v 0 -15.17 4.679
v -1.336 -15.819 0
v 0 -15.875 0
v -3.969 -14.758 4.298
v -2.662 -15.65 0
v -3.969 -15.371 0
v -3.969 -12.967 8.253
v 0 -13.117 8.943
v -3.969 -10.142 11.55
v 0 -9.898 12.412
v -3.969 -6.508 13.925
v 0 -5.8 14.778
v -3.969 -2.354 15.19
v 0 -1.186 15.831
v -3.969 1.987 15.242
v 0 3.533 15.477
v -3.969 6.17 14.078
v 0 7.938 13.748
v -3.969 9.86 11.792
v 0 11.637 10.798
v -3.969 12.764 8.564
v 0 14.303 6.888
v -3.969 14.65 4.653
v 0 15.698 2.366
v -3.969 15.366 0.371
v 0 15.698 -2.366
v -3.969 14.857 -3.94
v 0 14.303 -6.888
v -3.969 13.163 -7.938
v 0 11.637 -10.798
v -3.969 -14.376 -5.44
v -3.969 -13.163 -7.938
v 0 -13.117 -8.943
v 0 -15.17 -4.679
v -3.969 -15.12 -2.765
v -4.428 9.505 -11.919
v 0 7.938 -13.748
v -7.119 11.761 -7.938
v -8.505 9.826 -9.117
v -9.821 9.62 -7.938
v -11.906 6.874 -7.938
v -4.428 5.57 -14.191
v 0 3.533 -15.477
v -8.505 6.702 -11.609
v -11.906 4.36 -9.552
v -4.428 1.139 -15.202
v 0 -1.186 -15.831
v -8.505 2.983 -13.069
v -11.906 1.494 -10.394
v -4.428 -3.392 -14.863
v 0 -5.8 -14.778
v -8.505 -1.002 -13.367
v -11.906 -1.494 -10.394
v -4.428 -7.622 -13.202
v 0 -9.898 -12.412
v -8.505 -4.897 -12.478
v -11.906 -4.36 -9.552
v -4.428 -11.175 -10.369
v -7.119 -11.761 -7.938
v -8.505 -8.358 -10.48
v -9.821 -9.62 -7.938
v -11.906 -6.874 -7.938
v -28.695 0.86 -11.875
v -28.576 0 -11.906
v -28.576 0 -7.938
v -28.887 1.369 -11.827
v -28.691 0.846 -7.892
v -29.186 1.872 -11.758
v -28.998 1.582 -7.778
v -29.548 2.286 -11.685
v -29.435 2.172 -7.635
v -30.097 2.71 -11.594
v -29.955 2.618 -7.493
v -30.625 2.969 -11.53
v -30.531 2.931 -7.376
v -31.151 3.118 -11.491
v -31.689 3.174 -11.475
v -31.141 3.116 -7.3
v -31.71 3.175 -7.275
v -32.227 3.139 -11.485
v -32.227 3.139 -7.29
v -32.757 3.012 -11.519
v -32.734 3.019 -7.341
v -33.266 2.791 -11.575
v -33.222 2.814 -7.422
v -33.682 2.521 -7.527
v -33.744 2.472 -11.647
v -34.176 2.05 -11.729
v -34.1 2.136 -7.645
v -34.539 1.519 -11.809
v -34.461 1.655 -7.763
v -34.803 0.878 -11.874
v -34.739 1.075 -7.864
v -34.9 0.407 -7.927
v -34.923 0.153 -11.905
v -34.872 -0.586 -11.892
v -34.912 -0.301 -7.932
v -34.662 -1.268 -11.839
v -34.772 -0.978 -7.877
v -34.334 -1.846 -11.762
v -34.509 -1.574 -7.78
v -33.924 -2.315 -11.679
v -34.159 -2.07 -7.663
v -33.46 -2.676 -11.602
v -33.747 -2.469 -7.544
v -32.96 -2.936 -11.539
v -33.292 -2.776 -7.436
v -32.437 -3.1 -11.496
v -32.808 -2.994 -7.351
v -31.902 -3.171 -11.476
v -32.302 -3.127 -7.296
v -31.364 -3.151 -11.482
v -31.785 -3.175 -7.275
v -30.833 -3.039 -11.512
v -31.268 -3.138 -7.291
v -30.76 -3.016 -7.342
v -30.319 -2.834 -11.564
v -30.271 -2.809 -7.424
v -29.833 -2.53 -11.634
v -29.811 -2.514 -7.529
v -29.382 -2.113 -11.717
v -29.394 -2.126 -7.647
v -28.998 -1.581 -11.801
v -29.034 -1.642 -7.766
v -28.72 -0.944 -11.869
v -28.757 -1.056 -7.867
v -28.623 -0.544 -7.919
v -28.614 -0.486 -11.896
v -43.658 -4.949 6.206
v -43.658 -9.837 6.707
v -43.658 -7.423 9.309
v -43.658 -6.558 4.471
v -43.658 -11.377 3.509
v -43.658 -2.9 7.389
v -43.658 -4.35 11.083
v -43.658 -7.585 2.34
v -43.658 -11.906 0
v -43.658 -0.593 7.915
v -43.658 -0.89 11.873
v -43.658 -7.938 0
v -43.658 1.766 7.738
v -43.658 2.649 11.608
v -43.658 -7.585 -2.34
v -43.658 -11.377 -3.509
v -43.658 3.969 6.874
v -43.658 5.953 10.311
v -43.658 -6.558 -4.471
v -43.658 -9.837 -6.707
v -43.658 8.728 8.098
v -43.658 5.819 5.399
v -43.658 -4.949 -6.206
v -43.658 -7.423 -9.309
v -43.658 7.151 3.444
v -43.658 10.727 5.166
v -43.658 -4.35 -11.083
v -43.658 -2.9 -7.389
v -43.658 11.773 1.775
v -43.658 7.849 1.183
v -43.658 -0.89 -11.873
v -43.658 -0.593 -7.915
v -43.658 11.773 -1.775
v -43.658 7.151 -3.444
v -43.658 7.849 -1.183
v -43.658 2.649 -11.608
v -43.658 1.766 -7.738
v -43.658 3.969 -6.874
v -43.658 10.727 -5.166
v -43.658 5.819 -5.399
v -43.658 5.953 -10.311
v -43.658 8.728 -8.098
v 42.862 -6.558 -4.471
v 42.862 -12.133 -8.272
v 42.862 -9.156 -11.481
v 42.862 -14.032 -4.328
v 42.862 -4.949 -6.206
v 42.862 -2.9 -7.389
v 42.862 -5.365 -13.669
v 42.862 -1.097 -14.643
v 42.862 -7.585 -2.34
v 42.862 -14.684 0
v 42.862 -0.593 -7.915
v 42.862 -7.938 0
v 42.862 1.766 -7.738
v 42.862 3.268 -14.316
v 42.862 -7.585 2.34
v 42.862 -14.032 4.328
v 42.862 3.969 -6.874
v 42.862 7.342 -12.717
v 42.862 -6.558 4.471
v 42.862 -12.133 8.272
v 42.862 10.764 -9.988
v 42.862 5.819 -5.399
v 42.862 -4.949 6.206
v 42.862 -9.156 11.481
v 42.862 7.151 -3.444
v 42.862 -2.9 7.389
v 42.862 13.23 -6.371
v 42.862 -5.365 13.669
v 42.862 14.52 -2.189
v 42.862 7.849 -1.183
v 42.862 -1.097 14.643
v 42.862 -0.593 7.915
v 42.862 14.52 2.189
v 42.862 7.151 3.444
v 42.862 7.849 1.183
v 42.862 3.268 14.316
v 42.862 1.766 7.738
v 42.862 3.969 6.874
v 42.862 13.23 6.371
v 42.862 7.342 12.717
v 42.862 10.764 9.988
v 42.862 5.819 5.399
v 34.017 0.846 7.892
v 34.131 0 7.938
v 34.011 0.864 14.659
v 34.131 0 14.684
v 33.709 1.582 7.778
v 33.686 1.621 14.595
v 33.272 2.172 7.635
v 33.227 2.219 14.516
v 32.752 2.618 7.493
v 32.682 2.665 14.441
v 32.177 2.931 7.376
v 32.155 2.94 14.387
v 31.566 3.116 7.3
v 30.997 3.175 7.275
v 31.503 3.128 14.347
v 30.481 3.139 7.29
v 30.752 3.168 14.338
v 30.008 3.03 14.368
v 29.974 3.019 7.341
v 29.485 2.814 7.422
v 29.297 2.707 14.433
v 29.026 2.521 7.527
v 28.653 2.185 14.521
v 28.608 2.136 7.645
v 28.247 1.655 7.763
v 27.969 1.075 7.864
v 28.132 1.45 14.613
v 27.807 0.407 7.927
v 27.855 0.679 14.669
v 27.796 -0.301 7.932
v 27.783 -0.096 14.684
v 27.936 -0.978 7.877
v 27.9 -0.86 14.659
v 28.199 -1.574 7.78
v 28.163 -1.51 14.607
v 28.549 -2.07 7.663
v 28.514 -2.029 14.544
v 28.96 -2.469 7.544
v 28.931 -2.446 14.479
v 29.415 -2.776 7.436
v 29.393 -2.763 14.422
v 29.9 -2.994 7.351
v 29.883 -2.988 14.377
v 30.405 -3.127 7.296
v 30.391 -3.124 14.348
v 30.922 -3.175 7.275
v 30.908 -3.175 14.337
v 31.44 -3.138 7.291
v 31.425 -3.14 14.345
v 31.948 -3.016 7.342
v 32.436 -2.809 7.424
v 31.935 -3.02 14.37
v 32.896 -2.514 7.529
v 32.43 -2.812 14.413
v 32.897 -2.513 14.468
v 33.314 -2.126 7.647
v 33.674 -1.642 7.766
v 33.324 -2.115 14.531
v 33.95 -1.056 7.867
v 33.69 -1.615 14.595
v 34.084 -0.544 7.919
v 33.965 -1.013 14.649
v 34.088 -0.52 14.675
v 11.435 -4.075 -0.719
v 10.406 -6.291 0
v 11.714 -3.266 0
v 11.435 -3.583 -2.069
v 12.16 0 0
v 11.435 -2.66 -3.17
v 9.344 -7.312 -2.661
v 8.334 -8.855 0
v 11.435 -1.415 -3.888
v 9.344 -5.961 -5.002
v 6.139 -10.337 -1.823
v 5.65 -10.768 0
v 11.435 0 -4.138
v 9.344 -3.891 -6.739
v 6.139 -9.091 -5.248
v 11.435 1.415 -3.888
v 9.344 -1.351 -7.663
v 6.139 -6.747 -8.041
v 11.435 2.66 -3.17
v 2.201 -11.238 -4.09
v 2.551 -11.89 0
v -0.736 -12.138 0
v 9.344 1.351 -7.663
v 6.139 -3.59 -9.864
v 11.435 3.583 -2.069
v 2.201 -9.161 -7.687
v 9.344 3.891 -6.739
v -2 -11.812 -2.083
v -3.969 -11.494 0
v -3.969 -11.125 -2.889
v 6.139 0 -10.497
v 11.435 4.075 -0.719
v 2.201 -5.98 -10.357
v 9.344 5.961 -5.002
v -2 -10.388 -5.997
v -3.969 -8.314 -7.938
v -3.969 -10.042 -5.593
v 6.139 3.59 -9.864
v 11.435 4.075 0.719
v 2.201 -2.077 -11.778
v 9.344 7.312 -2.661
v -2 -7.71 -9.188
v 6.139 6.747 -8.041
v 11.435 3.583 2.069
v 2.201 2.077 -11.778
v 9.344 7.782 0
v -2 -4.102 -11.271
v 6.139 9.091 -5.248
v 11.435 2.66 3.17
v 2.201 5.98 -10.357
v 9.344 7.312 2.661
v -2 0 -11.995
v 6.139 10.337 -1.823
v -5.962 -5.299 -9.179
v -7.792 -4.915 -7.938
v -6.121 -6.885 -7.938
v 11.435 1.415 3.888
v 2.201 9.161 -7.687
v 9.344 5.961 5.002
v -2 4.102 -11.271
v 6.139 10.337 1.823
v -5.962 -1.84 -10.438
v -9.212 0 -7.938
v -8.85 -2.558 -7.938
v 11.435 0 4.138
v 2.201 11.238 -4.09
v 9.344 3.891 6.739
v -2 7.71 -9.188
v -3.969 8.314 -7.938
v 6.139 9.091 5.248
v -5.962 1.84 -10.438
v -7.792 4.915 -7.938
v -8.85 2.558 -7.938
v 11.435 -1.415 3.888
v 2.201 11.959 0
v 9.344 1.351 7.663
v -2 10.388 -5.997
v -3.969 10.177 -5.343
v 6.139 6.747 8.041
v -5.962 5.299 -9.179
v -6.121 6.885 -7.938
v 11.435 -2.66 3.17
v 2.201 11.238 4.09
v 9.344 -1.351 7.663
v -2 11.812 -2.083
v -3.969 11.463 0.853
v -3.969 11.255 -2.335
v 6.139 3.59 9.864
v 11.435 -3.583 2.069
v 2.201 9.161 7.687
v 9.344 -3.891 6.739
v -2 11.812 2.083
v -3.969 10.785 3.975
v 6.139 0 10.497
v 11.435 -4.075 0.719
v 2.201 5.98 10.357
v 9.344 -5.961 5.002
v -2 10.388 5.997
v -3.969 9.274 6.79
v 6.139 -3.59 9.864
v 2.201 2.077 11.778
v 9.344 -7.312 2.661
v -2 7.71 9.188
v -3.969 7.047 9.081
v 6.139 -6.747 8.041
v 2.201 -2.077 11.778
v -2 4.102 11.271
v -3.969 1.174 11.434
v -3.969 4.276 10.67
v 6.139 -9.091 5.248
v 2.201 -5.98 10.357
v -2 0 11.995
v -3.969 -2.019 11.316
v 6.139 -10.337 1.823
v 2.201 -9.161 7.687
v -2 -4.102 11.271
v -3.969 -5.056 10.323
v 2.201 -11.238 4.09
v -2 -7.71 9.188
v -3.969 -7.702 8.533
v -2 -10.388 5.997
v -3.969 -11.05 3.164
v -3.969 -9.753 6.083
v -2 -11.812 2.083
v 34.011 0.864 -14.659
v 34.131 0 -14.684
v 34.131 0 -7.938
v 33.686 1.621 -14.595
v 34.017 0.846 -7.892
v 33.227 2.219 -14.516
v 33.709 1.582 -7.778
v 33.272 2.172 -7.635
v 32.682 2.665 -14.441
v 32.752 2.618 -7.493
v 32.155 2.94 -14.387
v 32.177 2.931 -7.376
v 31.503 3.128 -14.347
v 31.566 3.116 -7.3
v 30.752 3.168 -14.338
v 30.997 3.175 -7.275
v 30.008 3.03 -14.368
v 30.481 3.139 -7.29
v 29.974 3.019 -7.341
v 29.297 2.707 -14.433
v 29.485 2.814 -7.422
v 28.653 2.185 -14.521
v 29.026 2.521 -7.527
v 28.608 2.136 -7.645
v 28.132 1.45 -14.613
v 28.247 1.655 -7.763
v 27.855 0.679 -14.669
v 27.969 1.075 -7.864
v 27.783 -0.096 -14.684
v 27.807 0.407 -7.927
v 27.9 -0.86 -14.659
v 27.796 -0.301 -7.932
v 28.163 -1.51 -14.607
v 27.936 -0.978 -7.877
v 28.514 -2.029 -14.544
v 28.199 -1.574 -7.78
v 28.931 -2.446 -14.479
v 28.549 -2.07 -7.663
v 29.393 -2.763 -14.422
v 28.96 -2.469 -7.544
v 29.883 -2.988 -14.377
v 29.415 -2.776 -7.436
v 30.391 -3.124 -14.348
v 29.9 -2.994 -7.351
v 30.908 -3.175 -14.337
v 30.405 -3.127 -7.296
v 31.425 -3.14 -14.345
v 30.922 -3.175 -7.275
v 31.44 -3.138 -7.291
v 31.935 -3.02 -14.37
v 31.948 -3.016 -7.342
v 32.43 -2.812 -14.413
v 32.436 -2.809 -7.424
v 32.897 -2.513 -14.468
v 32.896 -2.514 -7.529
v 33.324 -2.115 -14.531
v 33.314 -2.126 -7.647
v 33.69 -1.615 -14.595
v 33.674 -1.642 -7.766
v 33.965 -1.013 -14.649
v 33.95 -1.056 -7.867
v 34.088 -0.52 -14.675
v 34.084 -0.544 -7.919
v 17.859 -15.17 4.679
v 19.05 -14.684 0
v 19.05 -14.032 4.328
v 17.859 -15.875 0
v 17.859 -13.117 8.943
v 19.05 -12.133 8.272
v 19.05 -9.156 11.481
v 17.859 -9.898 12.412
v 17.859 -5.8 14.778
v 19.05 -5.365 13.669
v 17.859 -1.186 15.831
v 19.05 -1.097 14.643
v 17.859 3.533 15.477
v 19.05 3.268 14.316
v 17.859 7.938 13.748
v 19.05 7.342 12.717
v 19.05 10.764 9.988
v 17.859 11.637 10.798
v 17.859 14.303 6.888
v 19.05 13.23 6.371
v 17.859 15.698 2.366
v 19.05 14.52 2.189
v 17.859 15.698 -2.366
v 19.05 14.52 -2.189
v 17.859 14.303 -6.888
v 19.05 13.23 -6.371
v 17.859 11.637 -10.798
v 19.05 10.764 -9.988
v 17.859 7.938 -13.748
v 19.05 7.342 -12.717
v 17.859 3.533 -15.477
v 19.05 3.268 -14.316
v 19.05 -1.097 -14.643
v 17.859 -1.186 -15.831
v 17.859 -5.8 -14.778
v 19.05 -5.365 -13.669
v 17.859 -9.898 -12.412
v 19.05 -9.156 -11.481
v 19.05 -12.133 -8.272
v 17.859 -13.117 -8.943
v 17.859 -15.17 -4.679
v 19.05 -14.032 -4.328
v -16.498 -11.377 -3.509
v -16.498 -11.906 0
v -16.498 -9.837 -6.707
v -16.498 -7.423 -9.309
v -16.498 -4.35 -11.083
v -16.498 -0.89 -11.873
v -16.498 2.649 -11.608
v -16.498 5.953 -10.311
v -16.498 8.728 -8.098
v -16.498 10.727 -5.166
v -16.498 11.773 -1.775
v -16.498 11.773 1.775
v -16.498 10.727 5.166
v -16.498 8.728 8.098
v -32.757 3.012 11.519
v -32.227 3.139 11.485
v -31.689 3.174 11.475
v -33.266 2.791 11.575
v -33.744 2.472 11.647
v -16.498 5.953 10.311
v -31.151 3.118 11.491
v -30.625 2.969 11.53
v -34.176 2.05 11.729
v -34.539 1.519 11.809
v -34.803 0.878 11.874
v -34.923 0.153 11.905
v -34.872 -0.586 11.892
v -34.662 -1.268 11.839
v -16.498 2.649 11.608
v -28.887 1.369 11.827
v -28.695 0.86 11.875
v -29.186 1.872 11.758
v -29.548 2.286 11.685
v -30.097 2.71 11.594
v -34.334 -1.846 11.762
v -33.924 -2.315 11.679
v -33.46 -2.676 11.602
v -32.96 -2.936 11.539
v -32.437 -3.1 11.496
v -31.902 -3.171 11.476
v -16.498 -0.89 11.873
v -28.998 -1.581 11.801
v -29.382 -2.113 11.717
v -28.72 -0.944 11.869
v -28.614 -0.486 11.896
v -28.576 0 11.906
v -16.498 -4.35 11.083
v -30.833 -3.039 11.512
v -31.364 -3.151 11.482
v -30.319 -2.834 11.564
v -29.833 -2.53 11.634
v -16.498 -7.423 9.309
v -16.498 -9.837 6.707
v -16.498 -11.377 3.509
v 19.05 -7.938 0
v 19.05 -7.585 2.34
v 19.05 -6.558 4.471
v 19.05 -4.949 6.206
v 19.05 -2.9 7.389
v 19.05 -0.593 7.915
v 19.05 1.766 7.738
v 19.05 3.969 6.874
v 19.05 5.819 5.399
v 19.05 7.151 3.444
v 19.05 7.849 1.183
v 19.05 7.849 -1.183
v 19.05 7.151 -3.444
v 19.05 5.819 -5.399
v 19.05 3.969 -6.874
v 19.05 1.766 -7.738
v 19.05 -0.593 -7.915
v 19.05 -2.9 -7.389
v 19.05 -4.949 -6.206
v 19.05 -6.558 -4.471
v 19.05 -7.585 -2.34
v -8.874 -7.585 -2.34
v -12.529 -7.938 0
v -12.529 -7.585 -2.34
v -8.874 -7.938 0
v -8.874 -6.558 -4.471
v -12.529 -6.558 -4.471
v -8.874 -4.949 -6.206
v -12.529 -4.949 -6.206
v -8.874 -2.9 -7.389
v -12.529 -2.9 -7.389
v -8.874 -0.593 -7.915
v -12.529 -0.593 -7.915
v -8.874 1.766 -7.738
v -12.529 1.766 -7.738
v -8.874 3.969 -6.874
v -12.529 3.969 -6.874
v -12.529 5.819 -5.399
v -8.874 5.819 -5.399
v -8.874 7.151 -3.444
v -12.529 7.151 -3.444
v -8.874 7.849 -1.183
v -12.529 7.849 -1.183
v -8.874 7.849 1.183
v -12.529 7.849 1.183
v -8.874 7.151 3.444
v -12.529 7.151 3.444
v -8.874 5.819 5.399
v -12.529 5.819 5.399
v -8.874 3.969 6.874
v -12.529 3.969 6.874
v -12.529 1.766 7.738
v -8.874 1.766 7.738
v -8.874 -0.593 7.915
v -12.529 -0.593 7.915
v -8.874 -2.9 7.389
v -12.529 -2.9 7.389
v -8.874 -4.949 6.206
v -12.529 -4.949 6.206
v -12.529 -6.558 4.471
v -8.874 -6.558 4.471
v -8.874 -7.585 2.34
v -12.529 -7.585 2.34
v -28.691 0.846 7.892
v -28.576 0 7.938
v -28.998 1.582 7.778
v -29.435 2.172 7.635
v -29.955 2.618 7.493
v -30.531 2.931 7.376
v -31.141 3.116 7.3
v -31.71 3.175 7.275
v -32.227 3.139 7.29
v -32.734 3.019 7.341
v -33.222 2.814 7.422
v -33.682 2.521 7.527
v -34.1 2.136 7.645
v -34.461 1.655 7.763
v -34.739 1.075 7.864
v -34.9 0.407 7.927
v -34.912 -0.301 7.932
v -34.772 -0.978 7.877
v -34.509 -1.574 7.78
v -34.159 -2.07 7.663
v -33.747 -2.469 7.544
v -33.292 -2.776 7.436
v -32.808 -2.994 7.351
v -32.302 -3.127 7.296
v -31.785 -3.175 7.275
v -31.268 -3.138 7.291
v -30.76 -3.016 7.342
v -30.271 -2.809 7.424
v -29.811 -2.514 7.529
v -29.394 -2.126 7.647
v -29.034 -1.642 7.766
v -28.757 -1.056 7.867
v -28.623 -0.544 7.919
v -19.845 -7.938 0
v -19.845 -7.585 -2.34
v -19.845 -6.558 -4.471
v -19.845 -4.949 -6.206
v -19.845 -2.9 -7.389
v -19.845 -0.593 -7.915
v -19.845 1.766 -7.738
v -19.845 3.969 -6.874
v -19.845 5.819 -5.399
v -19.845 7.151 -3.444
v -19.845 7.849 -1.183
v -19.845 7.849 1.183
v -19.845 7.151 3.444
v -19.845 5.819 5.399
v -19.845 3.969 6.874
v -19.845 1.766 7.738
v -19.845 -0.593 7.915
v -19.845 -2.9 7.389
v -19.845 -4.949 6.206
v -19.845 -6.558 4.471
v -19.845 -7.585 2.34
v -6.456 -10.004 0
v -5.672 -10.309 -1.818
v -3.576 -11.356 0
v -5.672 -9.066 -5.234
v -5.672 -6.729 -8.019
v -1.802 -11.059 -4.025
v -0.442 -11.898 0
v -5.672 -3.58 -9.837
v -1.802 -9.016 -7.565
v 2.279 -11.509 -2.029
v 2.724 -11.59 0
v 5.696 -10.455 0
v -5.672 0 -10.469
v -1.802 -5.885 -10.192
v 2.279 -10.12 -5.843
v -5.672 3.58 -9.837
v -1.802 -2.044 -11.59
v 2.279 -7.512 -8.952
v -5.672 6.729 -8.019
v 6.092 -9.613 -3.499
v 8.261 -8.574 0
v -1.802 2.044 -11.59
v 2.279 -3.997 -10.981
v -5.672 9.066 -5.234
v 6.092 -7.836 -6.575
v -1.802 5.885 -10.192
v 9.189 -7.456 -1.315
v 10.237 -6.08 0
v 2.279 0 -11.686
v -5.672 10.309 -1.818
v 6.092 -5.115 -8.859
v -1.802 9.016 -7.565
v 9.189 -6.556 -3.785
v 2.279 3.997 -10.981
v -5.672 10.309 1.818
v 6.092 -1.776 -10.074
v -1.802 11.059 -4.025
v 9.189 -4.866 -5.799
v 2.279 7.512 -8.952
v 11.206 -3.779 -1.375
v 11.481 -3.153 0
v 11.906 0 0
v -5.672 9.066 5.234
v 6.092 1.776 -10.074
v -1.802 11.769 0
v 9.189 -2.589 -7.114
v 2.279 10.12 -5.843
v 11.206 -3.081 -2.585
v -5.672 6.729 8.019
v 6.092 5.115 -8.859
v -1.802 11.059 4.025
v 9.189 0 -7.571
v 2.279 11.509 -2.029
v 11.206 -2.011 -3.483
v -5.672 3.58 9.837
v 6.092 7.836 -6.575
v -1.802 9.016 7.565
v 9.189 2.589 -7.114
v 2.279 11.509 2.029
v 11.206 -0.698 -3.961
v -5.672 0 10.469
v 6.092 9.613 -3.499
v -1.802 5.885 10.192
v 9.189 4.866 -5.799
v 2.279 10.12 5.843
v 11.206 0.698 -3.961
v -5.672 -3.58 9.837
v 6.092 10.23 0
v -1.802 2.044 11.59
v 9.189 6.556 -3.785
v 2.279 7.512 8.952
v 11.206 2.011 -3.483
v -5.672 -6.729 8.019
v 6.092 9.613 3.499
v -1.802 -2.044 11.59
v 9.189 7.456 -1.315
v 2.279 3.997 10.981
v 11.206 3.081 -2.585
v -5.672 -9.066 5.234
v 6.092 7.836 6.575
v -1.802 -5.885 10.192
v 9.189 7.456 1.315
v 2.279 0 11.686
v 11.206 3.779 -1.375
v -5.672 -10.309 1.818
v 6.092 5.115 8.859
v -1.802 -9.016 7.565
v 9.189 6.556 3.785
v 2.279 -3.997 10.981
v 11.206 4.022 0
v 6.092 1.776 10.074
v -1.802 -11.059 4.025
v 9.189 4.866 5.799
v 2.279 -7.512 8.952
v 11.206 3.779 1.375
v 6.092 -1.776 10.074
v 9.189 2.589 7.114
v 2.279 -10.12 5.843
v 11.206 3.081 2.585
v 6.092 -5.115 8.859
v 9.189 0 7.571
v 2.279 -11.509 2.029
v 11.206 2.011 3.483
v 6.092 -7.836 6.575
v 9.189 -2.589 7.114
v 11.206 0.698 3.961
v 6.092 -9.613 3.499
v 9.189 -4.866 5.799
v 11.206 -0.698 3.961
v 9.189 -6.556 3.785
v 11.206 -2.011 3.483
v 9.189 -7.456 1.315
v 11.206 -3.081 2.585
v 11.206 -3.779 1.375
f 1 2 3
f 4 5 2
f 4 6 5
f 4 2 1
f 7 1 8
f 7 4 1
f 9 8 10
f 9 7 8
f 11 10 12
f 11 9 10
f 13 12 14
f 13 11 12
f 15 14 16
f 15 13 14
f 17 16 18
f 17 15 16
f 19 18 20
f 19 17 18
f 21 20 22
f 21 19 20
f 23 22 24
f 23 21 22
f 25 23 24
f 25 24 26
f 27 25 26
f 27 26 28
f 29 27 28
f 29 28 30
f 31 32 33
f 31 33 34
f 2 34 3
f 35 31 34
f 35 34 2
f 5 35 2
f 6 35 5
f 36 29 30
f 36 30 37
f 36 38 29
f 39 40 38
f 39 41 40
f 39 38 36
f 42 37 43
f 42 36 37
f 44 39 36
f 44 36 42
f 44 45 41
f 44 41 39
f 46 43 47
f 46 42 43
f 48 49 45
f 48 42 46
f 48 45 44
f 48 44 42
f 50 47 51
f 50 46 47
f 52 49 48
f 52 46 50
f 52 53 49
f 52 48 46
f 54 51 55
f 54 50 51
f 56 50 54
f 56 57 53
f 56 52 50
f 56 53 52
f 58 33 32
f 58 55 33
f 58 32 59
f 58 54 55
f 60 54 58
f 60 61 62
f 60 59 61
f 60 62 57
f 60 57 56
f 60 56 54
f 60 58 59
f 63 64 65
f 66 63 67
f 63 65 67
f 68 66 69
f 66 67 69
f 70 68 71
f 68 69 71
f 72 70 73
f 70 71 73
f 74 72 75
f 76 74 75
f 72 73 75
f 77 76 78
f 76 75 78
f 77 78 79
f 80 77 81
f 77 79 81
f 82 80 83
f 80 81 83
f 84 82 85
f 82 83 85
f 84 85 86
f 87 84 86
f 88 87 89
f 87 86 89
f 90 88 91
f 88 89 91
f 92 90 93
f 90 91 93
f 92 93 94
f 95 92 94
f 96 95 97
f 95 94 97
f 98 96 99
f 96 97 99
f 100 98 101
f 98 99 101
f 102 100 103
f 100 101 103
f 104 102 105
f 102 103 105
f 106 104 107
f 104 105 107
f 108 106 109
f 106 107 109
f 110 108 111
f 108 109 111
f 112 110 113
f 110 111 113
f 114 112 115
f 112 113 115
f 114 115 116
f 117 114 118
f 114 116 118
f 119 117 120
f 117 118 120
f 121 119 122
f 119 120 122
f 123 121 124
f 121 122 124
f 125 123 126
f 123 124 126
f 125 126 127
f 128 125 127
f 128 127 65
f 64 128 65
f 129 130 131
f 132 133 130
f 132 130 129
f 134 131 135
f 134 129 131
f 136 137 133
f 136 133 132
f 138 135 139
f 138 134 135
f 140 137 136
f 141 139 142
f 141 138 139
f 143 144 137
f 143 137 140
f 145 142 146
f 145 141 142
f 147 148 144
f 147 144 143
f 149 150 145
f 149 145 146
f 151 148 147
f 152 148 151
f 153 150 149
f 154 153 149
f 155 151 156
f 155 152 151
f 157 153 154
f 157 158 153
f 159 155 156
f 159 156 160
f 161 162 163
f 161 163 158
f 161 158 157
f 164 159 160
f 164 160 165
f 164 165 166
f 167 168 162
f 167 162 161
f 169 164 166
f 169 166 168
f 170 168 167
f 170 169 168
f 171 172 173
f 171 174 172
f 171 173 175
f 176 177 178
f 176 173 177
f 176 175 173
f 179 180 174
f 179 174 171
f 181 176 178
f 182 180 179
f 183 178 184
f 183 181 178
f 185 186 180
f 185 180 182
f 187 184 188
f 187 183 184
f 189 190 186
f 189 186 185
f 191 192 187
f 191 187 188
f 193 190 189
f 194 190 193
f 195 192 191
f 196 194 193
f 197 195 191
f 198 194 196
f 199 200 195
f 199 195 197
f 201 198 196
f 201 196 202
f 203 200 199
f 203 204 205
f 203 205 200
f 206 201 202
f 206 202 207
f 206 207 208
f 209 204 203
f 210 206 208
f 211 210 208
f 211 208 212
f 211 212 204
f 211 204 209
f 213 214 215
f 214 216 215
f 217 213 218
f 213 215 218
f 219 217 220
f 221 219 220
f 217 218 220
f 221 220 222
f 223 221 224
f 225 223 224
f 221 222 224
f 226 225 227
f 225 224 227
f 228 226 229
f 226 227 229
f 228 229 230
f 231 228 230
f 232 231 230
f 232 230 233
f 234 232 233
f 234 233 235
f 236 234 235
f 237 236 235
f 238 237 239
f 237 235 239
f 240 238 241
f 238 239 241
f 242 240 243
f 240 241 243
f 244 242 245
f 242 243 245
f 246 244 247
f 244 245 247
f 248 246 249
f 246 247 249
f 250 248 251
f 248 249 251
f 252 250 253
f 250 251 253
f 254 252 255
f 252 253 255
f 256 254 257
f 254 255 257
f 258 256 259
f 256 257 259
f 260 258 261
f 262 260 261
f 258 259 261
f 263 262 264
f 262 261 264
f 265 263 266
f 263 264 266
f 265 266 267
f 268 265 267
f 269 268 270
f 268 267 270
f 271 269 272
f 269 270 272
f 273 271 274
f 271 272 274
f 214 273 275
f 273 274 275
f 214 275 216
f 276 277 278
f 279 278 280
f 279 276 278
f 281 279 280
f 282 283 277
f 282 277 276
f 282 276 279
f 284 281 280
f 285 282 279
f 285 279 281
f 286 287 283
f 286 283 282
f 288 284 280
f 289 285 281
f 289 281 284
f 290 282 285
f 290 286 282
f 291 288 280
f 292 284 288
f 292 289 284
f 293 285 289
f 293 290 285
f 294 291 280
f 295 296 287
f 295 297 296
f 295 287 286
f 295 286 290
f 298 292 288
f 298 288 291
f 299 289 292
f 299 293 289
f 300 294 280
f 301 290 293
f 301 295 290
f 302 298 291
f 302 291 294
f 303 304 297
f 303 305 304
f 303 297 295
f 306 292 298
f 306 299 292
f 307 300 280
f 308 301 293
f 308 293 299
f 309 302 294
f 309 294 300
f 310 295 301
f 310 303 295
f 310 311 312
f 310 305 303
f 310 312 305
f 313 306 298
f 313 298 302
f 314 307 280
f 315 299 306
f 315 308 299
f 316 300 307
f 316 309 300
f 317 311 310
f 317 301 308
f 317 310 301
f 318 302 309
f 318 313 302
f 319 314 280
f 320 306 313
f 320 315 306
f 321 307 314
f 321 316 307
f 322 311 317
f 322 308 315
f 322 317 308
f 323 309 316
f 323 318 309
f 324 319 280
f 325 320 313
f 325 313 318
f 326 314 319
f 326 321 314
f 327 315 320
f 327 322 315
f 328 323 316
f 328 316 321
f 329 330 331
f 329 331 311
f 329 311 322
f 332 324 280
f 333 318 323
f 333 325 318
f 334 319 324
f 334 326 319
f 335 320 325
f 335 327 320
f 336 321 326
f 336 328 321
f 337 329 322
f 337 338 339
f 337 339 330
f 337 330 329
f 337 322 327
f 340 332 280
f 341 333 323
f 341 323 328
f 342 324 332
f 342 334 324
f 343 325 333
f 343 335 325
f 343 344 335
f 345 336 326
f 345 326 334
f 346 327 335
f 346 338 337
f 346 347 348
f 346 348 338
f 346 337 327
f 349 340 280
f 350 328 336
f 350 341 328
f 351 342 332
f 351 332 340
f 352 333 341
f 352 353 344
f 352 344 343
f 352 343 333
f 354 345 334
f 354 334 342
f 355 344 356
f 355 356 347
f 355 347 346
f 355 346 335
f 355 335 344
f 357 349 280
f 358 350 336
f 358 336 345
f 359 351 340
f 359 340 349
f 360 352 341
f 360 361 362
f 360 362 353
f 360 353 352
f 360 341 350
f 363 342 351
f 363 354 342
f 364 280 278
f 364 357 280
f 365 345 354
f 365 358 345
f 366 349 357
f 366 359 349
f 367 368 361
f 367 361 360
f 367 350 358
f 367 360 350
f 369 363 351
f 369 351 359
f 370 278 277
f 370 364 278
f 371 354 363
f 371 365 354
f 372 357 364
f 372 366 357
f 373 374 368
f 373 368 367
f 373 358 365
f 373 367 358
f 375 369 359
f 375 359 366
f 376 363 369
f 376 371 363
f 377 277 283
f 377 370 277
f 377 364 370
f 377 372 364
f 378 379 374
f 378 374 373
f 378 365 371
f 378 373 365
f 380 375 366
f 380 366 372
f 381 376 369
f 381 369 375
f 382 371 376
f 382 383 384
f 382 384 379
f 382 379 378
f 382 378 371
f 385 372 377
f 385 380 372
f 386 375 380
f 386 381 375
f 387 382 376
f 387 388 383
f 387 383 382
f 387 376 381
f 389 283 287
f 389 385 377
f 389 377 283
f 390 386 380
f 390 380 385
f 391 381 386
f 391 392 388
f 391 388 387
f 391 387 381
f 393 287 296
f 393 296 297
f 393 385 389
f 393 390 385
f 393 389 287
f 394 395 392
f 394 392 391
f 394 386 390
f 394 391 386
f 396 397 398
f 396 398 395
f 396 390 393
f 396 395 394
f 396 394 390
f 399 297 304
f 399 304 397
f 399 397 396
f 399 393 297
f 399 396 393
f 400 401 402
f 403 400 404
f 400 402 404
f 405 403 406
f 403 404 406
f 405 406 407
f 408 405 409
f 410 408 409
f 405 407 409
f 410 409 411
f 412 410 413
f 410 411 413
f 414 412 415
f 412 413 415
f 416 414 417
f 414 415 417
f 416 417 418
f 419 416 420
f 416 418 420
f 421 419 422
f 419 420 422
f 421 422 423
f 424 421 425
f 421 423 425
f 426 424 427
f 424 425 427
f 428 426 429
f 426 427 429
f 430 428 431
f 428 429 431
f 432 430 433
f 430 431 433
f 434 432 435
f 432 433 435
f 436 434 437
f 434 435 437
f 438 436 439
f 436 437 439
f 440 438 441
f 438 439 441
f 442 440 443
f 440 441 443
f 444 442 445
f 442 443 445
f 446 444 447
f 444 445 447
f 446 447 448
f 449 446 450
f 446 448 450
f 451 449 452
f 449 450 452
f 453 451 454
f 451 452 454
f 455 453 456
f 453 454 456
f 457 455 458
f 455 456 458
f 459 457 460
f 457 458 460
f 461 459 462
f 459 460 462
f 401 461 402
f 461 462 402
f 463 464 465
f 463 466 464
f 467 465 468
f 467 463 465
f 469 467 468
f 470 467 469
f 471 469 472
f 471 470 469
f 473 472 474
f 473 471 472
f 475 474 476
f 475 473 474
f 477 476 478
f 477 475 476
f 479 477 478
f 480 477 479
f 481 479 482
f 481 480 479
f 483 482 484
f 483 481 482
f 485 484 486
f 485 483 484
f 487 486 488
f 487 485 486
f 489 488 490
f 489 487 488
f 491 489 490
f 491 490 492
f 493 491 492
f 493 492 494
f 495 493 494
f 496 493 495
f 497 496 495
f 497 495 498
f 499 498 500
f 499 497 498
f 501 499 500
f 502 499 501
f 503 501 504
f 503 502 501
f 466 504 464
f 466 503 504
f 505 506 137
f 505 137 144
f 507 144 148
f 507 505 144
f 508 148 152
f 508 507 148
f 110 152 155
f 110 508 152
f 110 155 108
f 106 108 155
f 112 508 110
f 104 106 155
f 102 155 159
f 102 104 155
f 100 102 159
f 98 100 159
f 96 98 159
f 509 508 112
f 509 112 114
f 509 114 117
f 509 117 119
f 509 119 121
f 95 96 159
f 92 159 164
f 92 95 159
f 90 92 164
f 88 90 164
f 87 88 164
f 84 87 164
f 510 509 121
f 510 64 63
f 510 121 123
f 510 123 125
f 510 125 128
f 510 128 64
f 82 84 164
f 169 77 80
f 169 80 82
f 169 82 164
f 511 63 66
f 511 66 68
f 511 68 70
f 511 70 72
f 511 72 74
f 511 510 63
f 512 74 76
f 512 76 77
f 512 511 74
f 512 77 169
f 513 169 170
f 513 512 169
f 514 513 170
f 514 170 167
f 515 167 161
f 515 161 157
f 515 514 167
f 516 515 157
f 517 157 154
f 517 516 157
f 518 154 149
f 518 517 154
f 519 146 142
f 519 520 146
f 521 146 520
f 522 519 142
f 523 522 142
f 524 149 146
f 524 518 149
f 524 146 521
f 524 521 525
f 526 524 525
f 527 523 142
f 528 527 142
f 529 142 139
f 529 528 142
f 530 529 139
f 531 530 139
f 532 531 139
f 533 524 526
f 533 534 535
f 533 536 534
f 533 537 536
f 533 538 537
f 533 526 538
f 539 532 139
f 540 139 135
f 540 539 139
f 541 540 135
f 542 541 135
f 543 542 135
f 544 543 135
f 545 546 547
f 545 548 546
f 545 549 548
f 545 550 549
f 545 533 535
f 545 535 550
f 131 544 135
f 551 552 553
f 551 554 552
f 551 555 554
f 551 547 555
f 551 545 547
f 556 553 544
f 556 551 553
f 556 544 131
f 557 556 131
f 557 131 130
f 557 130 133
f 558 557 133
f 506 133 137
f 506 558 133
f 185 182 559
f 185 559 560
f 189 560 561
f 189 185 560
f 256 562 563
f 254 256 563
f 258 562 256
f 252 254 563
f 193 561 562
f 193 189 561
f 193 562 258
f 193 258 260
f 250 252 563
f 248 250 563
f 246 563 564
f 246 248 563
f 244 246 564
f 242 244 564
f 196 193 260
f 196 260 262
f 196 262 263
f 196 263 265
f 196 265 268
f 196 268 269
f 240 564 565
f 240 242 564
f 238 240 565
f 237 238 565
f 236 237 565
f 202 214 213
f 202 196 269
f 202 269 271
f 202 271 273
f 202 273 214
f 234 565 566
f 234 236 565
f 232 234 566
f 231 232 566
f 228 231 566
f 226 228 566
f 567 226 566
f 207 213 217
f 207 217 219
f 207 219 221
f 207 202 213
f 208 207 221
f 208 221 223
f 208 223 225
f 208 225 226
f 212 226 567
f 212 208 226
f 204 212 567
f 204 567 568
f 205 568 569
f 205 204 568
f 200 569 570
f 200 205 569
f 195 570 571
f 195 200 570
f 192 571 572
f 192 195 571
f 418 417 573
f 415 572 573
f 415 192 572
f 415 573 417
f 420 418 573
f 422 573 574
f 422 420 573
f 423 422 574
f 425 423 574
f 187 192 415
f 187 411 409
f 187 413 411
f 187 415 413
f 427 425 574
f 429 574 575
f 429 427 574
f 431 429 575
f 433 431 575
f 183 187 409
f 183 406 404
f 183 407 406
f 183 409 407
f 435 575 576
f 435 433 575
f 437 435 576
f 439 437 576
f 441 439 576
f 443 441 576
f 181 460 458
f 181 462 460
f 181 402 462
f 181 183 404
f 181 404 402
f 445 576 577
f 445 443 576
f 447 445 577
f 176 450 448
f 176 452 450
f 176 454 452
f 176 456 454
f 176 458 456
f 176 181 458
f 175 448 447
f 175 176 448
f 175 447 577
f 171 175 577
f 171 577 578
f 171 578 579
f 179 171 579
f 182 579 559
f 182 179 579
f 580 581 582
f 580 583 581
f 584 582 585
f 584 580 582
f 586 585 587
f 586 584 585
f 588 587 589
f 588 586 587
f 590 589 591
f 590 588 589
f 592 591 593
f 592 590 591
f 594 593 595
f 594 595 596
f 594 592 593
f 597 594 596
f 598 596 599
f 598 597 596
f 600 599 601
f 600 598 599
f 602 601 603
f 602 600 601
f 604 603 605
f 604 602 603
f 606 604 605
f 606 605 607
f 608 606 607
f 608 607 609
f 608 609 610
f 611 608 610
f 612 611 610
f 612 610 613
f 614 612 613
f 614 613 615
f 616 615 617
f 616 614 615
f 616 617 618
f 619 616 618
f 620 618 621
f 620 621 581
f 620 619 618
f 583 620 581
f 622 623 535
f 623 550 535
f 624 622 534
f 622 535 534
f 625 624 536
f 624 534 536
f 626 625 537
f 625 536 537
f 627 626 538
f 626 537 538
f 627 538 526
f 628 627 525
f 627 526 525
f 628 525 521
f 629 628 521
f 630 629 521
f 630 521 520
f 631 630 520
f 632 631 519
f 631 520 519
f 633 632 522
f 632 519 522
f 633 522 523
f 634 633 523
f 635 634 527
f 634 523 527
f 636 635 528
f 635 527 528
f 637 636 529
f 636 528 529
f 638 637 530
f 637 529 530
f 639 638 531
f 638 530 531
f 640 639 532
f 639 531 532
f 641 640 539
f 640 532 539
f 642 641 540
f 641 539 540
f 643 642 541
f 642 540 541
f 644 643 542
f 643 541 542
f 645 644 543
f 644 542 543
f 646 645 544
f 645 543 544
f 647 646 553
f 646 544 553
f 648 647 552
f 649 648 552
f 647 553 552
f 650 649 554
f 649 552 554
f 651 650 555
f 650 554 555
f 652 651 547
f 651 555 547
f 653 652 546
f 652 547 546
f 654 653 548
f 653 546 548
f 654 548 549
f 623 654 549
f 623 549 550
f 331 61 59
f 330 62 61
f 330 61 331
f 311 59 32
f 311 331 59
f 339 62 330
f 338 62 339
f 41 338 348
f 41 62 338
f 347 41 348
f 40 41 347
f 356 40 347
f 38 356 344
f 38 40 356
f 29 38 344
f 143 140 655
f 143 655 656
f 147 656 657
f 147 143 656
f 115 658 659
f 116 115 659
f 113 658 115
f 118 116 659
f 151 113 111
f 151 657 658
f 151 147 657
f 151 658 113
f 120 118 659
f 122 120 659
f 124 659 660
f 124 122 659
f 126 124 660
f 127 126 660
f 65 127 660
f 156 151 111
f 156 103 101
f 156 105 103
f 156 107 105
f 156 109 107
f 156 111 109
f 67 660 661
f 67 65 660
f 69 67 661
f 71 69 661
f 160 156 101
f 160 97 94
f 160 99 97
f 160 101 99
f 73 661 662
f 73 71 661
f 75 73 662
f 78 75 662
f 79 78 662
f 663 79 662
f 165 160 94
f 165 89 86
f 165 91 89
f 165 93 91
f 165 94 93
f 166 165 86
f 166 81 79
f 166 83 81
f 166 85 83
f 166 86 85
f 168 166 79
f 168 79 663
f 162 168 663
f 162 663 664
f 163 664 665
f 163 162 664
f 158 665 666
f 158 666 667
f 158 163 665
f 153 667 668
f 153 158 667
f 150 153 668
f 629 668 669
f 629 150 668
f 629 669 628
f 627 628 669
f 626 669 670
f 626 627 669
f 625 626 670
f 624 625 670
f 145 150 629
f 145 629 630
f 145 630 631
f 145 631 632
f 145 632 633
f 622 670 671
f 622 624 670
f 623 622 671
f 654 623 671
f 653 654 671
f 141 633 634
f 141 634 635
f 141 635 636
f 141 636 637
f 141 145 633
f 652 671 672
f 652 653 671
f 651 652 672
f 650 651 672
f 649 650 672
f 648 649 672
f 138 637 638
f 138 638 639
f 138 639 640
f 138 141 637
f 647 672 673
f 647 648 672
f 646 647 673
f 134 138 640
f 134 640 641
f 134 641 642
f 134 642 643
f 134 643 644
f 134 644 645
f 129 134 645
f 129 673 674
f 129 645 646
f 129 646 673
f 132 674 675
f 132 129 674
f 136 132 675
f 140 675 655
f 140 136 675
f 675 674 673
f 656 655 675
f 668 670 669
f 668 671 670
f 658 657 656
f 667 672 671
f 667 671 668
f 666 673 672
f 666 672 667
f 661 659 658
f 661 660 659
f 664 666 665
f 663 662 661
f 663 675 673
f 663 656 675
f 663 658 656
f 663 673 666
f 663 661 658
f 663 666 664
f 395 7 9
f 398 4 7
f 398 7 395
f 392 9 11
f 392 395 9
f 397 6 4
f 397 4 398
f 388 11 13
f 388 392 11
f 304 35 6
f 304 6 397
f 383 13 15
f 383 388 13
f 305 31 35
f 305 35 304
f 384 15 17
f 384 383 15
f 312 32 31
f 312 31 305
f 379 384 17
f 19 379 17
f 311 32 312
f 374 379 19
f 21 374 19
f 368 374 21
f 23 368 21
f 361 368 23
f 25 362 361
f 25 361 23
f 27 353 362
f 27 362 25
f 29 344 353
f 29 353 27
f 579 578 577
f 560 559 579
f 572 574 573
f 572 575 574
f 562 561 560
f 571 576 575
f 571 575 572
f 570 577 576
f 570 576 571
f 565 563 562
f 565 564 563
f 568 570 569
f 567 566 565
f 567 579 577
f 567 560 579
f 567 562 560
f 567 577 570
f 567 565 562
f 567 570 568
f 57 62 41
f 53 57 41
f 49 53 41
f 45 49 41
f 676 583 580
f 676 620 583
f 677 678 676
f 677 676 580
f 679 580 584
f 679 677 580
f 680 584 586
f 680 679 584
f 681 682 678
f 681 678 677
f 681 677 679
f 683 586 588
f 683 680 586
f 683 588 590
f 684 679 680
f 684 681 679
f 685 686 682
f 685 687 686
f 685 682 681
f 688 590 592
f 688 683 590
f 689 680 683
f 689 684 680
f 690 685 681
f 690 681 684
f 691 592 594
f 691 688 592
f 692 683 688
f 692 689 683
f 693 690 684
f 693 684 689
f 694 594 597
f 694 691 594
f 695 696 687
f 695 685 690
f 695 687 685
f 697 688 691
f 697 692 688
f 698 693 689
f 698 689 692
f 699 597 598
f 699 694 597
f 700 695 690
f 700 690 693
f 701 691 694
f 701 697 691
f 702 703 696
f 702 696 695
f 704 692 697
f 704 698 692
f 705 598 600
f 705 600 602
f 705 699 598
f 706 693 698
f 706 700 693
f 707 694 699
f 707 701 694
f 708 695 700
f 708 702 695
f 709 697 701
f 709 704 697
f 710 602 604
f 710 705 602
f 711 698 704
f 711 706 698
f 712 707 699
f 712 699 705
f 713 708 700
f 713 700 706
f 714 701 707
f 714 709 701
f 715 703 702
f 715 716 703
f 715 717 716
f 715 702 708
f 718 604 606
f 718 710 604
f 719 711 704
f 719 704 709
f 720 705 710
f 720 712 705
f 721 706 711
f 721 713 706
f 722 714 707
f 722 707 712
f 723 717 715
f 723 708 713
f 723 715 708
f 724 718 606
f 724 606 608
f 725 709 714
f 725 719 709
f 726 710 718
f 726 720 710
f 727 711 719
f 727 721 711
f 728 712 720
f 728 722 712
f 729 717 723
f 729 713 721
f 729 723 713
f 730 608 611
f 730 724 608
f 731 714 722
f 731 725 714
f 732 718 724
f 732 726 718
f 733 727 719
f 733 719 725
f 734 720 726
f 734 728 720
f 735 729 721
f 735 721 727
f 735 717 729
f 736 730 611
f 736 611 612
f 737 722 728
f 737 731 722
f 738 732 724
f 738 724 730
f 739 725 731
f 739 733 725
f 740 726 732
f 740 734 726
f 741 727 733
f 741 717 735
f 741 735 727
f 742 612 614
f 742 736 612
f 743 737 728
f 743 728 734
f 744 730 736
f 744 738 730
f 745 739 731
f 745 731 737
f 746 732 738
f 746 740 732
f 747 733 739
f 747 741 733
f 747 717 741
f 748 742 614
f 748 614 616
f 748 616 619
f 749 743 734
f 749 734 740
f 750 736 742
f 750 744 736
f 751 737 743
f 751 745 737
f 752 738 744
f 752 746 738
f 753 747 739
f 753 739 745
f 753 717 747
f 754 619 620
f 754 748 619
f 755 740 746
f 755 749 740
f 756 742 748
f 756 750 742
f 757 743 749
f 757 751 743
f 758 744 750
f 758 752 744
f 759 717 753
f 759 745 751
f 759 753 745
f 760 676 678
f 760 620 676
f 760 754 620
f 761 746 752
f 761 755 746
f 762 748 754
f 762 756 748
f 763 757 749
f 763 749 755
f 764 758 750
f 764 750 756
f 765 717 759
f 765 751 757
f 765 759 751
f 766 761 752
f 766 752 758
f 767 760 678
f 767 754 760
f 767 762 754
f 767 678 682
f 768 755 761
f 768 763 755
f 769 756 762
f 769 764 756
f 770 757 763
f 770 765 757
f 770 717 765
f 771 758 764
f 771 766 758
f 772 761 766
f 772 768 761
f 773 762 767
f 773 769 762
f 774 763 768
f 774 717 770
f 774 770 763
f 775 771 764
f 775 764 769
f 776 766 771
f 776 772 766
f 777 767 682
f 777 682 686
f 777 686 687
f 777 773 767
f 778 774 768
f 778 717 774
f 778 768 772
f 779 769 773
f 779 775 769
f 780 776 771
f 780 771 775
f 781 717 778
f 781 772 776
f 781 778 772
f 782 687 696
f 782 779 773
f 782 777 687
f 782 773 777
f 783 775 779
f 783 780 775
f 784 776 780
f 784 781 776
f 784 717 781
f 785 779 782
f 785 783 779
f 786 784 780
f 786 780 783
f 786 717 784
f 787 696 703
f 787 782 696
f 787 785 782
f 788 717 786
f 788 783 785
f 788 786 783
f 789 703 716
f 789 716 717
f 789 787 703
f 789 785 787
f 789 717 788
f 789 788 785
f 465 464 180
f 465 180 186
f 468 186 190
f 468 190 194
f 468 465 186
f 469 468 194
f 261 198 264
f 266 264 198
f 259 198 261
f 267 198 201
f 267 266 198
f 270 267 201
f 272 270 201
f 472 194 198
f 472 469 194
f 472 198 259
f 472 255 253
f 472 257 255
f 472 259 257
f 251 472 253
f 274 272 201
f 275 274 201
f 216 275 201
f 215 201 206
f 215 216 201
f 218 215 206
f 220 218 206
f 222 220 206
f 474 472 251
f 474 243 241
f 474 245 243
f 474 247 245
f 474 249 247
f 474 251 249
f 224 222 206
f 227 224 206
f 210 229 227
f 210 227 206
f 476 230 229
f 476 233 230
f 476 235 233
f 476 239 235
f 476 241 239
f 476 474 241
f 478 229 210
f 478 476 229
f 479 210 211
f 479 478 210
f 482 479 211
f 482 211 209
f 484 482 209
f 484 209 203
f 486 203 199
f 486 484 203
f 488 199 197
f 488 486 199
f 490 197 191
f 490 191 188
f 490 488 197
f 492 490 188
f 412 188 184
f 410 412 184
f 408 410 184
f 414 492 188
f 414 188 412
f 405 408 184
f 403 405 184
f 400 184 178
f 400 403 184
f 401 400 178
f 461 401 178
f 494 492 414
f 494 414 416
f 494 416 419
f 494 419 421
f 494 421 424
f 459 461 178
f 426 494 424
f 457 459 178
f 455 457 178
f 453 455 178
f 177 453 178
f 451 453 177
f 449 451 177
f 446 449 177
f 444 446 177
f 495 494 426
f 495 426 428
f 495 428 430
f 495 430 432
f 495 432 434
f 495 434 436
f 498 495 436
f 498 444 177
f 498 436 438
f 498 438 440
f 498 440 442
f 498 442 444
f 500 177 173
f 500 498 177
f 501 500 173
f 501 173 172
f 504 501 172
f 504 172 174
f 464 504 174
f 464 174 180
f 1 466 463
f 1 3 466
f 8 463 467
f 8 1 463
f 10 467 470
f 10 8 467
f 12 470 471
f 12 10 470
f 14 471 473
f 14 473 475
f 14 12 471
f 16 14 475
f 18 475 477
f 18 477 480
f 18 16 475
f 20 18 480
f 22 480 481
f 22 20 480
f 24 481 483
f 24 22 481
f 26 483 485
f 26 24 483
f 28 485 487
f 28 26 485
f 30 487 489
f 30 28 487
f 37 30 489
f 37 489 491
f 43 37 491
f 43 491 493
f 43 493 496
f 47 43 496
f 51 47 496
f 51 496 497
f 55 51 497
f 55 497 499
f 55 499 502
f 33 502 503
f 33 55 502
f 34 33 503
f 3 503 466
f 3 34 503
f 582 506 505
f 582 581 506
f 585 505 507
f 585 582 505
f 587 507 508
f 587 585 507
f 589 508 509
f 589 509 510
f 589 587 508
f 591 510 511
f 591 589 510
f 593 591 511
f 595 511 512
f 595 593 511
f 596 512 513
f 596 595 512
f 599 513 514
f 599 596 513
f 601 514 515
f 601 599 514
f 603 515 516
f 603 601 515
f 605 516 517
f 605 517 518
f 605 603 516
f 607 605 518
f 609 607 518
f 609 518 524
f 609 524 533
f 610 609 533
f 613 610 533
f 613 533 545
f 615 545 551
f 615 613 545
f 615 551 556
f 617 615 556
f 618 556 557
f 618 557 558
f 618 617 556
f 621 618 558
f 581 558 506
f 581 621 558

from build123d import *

# Parameters (mm, degrees)
SKETCH3_W               = 15.87627
SKETCH3_H               = 31.75
CUT_EXTRUDE1_DEPTH      = 16.875
CUT_EXTRUDE1_DEPTH_BACK = 7.9375
SKETCH5_W               = 7.93877
SKETCH5_H               = 13.748153286
CUT_EXTRUDE2_DEPTH      = 16.875
SKETCH8_R               = 3.175
CUT_EXTRUDE3_DEPTH      = 16.875
CUT_EXTRUDE3_DEPTH_BACK = 16.875


with BuildPart() as part:
    # Sketch1 → Revolve1 (revolve)
    with BuildSketch(Plane.XY):
        with BuildLine():
            Line((-12.528779942, -7.9375), (-8.874394786, -7.9375))
            ThreePointArc((-8.874394786, -7.9375), (4.248413006, -11.122489649), (11.90625, 0))
            Line((11.90625, 0), (-19.84502, 0))
            Line((-19.84502, 0), (-19.84502, -7.9375))
            Line((-19.84502, -7.9375), (-43.65752, -7.9375))
            Line((-43.65752, -7.9375), (-43.65752, -11.90625))
            Line((-43.65752, -11.90625), (-16.497529942, -11.90625))
            Line((-16.497529942, -11.90625), (-12.528779942, -7.9375))
        make_face()
    revolve(axis=Axis((-19.84502, 0, 0), (1, 0, 0)))


with BuildPart() as body_2:
    # Sketch2 → Revolve2 (revolve)
    with BuildSketch(Plane.XY):
        with BuildLine():
            Line((19.05, 0), (19.05, -7.9375))
            Line((19.05, -7.9375), (42.8625, -7.9375))
            Line((42.8625, -7.9375), (42.8625, -14.684375))
            Line((42.8625, -14.684375), (19.05, -14.684375))
            Line((19.05, -14.684375), (17.859375, -15.875))
            Line((17.859375, -15.875), (0, -15.875))
            ThreePointArc((0, -15.875), (-11.225320151, -11.225320151), (-15.875, 0))
            Line((-15.875, 0), (19.05, 0))
        make_face()
    revolve(axis=Axis((19.05, 0, 0), (-1, 0, 0)))

    # Sketch3 → Cut-Extrude1 (cut, two sides)
    with BuildSketch(Plane.XY) as cut_extrude1_sk:
        with Locations((-11.906885, 0)):
            Rectangle(SKETCH3_W, SKETCH3_H)
    extrude(amount=CUT_EXTRUDE1_DEPTH, mode=Mode.SUBTRACT)
    extrude(cut_extrude1_sk.sketch, amount=-CUT_EXTRUDE1_DEPTH_BACK, mode=Mode.SUBTRACT)

    # Sketch5 → Cut-Extrude2 (cut, through all)
    with BuildSketch(Plane.XY):
        with Locations((-15.875635, 0)):
            Rectangle(SKETCH5_W, SKETCH5_H)
    extrude(amount=-CUT_EXTRUDE2_DEPTH, mode=Mode.SUBTRACT)

    # Sketch6 → Cut-Revolve2 (revolve, cut)
    with BuildSketch(Plane.XY):
        with BuildLine():
            Line((-12.16025, 0), (12.16025, 0))
            ThreePointArc((12.16025, 0), (0, -12.16025), (-12.16025, 0))
        make_face()
    revolve(axis=Axis((-12.16025, 0, 0), (1, 0, 0)), mode=Mode.SUBTRACT)


with BuildPart() as cut_extrude3_tool:
    # Sketch8 → Cut-Extrude3 (new body, two sides)
    with BuildSketch(Plane.XY) as cut_extrude3_sk:
        with Locations((-31.75127, 0)):
            Circle(SKETCH8_R)
        with Locations((30.95625, 0)):
            Circle(SKETCH8_R)
    extrude(amount=CUT_EXTRUDE3_DEPTH)
    extrude(cut_extrude3_sk.sketch, amount=-CUT_EXTRUDE3_DEPTH_BACK)


with BuildPart() as part_1:
    add(part.part)

    # Cut-Extrude3: cut by cut_extrude3_tool
    add(cut_extrude3_tool.part, mode=Mode.SUBTRACT)


with BuildPart() as body_2_1:
    add(body_2.part)

    # Cut-Extrude3: cut by cut_extrude3_tool
    add(cut_extrude3_tool.part, mode=Mode.SUBTRACT)


solid = Compound([part_1.part, body_2_1.part])
